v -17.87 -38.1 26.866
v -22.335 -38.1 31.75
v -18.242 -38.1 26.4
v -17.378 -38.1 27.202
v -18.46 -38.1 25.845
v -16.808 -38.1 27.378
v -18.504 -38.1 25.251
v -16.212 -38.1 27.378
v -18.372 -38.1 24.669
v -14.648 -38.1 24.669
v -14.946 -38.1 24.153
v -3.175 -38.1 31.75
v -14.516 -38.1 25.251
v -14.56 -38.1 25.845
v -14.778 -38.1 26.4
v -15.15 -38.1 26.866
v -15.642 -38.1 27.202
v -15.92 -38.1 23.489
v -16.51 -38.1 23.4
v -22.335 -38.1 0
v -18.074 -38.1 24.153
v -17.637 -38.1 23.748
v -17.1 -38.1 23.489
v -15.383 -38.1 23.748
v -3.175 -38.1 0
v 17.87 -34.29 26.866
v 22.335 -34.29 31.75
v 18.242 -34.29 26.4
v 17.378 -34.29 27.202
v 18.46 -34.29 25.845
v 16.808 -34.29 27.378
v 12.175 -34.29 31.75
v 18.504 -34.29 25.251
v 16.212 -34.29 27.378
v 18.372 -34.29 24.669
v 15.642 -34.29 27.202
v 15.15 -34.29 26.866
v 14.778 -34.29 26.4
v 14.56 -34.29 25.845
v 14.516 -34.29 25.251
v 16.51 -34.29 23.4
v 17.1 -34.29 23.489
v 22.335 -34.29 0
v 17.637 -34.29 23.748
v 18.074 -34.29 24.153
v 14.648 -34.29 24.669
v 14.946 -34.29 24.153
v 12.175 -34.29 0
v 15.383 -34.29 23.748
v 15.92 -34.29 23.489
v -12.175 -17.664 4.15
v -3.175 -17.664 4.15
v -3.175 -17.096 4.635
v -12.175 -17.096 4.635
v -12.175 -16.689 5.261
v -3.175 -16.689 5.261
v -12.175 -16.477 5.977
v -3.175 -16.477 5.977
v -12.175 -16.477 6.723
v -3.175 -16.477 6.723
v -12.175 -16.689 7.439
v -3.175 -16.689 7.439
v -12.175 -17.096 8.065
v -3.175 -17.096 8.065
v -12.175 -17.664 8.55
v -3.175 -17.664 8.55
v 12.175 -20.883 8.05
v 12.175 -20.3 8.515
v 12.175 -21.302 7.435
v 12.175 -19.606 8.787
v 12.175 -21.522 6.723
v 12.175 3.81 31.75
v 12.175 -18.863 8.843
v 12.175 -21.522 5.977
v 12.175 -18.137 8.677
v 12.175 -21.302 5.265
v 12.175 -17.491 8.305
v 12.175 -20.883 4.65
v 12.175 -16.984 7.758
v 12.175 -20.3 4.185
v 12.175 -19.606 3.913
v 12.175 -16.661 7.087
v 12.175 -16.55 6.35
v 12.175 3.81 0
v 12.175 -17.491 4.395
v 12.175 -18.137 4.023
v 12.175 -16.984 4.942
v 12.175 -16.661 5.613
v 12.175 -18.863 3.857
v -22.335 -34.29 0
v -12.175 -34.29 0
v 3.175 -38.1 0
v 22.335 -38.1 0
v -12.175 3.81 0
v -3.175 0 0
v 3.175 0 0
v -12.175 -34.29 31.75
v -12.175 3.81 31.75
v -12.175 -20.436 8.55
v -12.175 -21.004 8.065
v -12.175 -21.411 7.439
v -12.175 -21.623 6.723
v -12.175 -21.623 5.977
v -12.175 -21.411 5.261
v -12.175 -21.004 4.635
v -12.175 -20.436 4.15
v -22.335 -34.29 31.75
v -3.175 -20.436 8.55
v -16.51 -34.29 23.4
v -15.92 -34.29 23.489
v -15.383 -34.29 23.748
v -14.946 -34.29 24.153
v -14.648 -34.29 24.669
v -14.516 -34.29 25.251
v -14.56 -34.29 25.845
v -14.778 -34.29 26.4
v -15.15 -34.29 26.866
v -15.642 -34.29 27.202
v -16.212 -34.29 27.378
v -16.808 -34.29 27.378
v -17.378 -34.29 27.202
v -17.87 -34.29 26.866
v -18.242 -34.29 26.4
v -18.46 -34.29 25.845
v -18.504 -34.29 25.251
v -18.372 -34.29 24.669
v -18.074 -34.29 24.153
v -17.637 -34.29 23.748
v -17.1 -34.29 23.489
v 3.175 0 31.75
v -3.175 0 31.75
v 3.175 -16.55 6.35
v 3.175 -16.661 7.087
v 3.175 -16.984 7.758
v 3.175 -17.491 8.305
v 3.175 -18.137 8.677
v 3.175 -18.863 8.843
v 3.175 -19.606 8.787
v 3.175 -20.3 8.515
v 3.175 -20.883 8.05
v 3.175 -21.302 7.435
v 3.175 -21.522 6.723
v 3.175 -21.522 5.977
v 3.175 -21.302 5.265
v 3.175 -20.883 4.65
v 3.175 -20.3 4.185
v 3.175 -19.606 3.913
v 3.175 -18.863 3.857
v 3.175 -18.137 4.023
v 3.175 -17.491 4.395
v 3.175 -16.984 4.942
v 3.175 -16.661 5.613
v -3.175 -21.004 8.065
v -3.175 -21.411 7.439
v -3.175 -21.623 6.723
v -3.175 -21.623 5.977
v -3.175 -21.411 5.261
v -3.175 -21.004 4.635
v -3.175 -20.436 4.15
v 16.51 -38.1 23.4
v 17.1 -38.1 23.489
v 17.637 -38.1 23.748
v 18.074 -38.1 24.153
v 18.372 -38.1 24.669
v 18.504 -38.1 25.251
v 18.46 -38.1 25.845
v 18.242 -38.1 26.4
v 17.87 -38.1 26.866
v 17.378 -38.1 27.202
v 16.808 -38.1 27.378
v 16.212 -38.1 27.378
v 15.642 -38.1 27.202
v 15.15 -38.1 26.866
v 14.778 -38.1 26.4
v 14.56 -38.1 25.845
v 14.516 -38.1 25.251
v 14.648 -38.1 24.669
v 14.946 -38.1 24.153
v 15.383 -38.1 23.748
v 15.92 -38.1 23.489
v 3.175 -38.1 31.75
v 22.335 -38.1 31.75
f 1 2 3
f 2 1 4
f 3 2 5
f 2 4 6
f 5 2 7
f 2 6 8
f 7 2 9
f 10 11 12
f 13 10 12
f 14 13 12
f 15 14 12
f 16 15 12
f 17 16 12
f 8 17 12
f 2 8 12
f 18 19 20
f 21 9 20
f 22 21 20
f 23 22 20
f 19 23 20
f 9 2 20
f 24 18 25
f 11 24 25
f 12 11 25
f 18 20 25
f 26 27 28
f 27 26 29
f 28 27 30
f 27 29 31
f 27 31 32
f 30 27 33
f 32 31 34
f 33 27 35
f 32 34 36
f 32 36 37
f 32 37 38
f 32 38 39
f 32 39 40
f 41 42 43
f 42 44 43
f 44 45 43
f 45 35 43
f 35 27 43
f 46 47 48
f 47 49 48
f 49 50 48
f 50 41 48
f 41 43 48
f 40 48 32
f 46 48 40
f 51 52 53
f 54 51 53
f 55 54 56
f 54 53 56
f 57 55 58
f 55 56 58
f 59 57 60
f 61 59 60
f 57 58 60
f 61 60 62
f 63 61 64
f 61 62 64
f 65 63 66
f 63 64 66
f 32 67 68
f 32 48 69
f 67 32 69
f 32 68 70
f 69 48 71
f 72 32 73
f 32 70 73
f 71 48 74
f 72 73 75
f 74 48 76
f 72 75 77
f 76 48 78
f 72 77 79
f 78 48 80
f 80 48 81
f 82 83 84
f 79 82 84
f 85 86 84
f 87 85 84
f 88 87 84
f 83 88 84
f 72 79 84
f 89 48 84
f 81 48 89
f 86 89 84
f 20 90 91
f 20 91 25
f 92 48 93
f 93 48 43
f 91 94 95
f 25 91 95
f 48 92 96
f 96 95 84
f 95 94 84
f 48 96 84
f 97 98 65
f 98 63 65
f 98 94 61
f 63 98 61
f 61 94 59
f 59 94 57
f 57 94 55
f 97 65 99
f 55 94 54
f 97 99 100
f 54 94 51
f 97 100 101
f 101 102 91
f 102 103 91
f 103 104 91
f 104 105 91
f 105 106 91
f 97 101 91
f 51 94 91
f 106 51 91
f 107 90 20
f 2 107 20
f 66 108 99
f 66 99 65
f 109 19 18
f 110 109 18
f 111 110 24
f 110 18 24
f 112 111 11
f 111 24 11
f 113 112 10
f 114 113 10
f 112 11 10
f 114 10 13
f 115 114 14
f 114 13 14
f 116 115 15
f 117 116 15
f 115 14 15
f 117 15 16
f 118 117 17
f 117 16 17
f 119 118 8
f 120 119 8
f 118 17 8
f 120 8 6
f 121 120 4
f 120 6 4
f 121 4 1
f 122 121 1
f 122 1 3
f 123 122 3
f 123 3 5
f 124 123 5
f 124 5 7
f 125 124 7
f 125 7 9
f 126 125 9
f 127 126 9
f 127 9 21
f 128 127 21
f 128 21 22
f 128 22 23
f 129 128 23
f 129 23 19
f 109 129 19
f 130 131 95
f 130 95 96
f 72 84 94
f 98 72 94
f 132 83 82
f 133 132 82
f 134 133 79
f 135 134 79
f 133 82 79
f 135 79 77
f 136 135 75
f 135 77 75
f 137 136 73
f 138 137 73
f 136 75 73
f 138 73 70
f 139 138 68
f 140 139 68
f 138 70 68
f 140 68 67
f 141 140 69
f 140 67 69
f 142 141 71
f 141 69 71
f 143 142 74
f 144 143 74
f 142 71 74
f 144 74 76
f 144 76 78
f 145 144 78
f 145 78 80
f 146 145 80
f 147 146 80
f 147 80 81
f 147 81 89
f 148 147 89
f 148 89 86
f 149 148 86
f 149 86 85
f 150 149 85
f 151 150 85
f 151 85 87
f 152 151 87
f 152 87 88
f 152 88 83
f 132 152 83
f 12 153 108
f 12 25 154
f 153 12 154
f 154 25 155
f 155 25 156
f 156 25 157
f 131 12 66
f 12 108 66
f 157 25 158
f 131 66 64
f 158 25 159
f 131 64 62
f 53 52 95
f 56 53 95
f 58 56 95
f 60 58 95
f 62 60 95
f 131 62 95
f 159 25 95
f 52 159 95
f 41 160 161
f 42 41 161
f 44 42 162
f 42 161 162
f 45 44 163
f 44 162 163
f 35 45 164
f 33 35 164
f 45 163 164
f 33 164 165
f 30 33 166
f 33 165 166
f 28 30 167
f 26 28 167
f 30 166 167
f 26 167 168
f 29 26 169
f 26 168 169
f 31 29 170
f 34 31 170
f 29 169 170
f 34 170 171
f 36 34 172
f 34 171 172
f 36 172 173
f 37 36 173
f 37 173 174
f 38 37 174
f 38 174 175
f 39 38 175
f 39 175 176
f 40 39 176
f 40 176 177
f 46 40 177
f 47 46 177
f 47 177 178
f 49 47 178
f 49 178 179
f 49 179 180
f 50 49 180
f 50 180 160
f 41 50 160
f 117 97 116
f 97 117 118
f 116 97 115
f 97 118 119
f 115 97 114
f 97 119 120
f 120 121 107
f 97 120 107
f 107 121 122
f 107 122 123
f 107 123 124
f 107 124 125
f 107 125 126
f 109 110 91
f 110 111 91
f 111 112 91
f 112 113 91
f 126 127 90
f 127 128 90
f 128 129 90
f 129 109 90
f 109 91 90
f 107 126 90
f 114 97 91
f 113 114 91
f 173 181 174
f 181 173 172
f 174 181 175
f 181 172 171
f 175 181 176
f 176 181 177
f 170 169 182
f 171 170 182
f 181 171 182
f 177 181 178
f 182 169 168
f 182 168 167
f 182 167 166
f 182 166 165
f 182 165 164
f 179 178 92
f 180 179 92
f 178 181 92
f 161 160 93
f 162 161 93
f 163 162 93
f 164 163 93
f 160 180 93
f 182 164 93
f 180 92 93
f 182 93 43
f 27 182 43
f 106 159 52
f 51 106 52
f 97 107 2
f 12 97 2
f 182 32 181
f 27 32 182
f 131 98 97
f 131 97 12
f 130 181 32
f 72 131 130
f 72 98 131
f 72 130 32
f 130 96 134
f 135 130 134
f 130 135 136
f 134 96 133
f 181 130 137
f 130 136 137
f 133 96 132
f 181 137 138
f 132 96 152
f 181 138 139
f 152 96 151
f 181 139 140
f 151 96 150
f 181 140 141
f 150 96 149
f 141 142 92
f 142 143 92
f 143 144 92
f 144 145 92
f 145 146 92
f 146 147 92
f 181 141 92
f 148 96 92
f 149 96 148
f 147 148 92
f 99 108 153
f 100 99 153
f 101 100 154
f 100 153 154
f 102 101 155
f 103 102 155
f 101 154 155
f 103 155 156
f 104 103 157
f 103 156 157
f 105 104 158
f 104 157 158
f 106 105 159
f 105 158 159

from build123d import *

# Parameters (mm, degrees)
BOSS_EXTRUDE1_DEPTH = 31.75
SKETCH2_R           = 2
CUT_EXTRUDE1_DEPTH  = 58.12585076
CUT_EXTRUDE2_REACH  = 62.42
SKETCH3_W           = 4.4
SKETCH3_H           = 2.771281292
CUT_EXTRUDE3_START  = -9
CUT_EXTRUDE3_DEPTH  = 9
CUT_EXTRUDE4_REACH  = 62.42
SKETCH5_R           = 2.5


with BuildPart() as part:
    # Sketch1 → Boss-Extrude1 (new body)
    with BuildSketch(Plane.XY):
        Polygon((-3.175, 0), (3.175, 0), (3.175, -38.1), (22.335, -38.1), (22.335, -34.29), (12.175, -34.29), (12.175, 3.81), (-12.175, 3.81), (-12.175, -34.29), (-22.335, -34.29), (-22.335, -38.1), (-3.175, -38.1), align=None)
    extrude(amount=BOSS_EXTRUDE1_DEPTH)

    # Sketch2 → Cut-Extrude1 (cut, through all)
    with BuildSketch(Plane.XZ.offset(38.1)):
        with Locations(Location((-16.51, 25.4, 0), (0, 0, 270))):
            Circle(SKETCH2_R)
        with Locations(Location((16.51, 25.4, 0), (0, 0, 270))):
            Circle(SKETCH2_R)
    extrude(amount=-CUT_EXTRUDE1_DEPTH, mode=Mode.SUBTRACT)

    # Sketch3 → Cut-Extrude2 (cut, up to next)
    with BuildSketch(Plane.ZY.offset(12.175), mode=Mode.PRIVATE) as cut_extrude2_sk1:
        with Locations((6.35, -19.05)):
            Rectangle(SKETCH3_W, SKETCH3_H)
    cut_extrude2_tool1 = extrude(cut_extrude2_sk1.sketch, amount=-CUT_EXTRUDE2_REACH, mode=Mode.PRIVATE) & part.part
    add(cut_extrude2_tool1.solids().sort_by_distance((-12.175, -19.05, 6.35))[0], mode=Mode.SUBTRACT)

    # Sketch4 → Cut-Extrude3 (cut)
    with BuildSketch(Plane.ZY.offset(12.175).offset(CUT_EXTRUDE3_START)):
        with BuildLine():
            Line((4.15, -20.435640646), (4.15, -17.664359354))
            ThreePointArc((4.15, -17.664359354), (6.35, -16.45), (8.55, -17.664359354))
            Line((8.55, -17.664359354), (8.55, -20.435640646))
            ThreePointArc((8.55, -20.435640646), (6.35, -21.65), (4.15, -20.435640646))
        make_face()
    extrude(amount=CUT_EXTRUDE3_DEPTH, mode=Mode.SUBTRACT)

    # Sketch5 → Cut-Extrude4 (cut, up to next)
    with BuildSketch(Plane(origin=(12.175, 0, 0), x_dir=(0, 0, -1), z_dir=(1, 0, 0)), mode=Mode.PRIVATE) as cut_extrude4_sk1:
        with Locations(Location((-6.35, -19.05, 0), (0, 0, 90))):
            Circle(SKETCH5_R)
    cut_extrude4_tool1 = extrude(cut_extrude4_sk1.sketch, amount=-CUT_EXTRUDE4_REACH, mode=Mode.PRIVATE) & part.part
    add(cut_extrude4_tool1.solids().sort_by_distance((12.175, -19.05, 6.35))[0], mode=Mode.SUBTRACT)


solid = part.part
